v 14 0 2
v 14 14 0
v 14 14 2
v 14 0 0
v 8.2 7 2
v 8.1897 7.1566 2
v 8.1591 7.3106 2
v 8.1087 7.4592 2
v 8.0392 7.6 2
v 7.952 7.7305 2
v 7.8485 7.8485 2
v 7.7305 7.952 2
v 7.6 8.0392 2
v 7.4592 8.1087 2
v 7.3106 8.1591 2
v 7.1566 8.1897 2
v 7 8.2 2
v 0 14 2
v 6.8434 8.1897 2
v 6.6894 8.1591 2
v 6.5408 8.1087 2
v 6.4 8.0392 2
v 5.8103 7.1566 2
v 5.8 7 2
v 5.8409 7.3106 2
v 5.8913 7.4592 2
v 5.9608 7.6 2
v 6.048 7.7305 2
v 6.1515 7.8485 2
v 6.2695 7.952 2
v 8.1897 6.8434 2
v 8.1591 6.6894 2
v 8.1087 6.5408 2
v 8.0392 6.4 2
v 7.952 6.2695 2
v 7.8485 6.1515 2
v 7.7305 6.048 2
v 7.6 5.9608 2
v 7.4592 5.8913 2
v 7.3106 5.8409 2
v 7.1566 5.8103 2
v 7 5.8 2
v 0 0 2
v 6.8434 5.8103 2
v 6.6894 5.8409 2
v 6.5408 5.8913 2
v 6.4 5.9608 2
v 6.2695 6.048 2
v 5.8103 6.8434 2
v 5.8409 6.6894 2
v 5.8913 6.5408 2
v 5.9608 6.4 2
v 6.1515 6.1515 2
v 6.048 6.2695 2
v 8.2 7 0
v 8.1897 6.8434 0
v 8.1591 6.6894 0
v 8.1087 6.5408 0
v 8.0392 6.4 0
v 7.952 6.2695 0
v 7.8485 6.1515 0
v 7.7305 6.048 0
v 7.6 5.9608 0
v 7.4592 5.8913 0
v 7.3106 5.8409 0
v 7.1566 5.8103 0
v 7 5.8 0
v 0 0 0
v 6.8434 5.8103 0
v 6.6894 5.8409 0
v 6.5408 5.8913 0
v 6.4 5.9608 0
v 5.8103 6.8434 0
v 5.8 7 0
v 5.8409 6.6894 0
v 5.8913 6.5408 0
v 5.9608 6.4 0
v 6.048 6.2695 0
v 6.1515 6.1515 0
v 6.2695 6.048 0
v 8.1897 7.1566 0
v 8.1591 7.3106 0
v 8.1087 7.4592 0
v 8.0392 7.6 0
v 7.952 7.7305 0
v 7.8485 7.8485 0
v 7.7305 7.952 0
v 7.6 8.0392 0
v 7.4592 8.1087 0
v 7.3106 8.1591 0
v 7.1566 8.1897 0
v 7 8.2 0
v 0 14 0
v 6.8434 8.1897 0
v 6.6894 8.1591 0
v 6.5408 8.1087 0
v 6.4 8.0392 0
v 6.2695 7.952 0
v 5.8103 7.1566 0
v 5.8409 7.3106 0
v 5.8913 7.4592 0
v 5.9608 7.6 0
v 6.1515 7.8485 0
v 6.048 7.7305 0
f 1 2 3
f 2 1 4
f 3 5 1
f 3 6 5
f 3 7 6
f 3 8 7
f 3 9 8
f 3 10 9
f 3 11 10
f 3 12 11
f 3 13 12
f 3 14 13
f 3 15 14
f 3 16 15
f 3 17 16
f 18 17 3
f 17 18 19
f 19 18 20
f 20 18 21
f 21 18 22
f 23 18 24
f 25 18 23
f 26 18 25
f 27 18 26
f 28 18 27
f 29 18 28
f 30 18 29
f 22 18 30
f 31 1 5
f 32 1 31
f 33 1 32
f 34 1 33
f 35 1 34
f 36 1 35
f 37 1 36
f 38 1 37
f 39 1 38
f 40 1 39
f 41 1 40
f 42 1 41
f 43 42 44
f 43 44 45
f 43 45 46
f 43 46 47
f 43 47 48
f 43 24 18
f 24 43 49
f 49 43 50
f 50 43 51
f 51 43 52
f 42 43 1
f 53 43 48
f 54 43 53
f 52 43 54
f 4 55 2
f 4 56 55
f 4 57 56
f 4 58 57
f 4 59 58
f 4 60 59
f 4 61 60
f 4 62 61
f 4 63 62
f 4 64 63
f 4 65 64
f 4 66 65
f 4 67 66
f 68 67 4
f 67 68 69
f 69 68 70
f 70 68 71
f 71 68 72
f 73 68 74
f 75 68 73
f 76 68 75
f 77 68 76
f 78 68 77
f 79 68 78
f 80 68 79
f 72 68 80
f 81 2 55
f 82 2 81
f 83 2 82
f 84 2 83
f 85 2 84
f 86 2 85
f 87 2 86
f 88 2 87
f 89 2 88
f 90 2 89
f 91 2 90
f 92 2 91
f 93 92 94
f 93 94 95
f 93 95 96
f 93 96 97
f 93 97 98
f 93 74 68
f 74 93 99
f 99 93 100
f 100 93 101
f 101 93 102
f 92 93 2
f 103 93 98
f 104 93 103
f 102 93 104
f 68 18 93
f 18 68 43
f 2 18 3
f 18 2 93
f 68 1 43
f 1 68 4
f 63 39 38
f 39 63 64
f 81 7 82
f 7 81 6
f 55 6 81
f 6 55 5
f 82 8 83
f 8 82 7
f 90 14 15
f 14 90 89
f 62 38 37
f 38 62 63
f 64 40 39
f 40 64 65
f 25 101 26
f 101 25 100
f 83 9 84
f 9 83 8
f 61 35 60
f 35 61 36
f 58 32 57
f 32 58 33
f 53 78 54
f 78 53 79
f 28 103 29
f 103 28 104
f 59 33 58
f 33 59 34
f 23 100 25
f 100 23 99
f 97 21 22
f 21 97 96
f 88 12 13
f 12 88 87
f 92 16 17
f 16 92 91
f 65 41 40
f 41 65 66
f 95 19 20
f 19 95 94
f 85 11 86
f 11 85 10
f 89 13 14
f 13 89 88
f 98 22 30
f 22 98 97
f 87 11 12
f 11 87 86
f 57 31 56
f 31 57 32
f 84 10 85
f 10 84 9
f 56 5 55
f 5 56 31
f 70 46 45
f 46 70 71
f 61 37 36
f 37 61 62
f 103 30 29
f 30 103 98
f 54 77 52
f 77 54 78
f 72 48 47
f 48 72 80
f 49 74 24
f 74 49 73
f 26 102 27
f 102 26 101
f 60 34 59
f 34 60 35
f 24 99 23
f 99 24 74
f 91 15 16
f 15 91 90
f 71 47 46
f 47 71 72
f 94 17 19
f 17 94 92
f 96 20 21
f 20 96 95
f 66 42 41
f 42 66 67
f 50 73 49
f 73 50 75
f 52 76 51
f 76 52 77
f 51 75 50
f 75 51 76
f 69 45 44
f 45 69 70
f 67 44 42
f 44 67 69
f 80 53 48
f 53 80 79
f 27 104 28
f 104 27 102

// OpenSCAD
// Screw fit test, mm. part: base or cap. Flat seating for external socket heads, no countersink.
part="cap";
module base(){difference(){
translate([0, 0, 0]) cube([14, 14, 12]);
translate([7, 7, 2]) cylinder(h=10.2,r=0.85,$fn=48);
}}
module cap(){difference(){
translate([0, 0, 0]) cube([14, 14, 2]);
translate([7, 7, -0.1]) cylinder(h=2.2,r=1.2,$fn=48);
}}
if(part=="base") base(); else cap();
